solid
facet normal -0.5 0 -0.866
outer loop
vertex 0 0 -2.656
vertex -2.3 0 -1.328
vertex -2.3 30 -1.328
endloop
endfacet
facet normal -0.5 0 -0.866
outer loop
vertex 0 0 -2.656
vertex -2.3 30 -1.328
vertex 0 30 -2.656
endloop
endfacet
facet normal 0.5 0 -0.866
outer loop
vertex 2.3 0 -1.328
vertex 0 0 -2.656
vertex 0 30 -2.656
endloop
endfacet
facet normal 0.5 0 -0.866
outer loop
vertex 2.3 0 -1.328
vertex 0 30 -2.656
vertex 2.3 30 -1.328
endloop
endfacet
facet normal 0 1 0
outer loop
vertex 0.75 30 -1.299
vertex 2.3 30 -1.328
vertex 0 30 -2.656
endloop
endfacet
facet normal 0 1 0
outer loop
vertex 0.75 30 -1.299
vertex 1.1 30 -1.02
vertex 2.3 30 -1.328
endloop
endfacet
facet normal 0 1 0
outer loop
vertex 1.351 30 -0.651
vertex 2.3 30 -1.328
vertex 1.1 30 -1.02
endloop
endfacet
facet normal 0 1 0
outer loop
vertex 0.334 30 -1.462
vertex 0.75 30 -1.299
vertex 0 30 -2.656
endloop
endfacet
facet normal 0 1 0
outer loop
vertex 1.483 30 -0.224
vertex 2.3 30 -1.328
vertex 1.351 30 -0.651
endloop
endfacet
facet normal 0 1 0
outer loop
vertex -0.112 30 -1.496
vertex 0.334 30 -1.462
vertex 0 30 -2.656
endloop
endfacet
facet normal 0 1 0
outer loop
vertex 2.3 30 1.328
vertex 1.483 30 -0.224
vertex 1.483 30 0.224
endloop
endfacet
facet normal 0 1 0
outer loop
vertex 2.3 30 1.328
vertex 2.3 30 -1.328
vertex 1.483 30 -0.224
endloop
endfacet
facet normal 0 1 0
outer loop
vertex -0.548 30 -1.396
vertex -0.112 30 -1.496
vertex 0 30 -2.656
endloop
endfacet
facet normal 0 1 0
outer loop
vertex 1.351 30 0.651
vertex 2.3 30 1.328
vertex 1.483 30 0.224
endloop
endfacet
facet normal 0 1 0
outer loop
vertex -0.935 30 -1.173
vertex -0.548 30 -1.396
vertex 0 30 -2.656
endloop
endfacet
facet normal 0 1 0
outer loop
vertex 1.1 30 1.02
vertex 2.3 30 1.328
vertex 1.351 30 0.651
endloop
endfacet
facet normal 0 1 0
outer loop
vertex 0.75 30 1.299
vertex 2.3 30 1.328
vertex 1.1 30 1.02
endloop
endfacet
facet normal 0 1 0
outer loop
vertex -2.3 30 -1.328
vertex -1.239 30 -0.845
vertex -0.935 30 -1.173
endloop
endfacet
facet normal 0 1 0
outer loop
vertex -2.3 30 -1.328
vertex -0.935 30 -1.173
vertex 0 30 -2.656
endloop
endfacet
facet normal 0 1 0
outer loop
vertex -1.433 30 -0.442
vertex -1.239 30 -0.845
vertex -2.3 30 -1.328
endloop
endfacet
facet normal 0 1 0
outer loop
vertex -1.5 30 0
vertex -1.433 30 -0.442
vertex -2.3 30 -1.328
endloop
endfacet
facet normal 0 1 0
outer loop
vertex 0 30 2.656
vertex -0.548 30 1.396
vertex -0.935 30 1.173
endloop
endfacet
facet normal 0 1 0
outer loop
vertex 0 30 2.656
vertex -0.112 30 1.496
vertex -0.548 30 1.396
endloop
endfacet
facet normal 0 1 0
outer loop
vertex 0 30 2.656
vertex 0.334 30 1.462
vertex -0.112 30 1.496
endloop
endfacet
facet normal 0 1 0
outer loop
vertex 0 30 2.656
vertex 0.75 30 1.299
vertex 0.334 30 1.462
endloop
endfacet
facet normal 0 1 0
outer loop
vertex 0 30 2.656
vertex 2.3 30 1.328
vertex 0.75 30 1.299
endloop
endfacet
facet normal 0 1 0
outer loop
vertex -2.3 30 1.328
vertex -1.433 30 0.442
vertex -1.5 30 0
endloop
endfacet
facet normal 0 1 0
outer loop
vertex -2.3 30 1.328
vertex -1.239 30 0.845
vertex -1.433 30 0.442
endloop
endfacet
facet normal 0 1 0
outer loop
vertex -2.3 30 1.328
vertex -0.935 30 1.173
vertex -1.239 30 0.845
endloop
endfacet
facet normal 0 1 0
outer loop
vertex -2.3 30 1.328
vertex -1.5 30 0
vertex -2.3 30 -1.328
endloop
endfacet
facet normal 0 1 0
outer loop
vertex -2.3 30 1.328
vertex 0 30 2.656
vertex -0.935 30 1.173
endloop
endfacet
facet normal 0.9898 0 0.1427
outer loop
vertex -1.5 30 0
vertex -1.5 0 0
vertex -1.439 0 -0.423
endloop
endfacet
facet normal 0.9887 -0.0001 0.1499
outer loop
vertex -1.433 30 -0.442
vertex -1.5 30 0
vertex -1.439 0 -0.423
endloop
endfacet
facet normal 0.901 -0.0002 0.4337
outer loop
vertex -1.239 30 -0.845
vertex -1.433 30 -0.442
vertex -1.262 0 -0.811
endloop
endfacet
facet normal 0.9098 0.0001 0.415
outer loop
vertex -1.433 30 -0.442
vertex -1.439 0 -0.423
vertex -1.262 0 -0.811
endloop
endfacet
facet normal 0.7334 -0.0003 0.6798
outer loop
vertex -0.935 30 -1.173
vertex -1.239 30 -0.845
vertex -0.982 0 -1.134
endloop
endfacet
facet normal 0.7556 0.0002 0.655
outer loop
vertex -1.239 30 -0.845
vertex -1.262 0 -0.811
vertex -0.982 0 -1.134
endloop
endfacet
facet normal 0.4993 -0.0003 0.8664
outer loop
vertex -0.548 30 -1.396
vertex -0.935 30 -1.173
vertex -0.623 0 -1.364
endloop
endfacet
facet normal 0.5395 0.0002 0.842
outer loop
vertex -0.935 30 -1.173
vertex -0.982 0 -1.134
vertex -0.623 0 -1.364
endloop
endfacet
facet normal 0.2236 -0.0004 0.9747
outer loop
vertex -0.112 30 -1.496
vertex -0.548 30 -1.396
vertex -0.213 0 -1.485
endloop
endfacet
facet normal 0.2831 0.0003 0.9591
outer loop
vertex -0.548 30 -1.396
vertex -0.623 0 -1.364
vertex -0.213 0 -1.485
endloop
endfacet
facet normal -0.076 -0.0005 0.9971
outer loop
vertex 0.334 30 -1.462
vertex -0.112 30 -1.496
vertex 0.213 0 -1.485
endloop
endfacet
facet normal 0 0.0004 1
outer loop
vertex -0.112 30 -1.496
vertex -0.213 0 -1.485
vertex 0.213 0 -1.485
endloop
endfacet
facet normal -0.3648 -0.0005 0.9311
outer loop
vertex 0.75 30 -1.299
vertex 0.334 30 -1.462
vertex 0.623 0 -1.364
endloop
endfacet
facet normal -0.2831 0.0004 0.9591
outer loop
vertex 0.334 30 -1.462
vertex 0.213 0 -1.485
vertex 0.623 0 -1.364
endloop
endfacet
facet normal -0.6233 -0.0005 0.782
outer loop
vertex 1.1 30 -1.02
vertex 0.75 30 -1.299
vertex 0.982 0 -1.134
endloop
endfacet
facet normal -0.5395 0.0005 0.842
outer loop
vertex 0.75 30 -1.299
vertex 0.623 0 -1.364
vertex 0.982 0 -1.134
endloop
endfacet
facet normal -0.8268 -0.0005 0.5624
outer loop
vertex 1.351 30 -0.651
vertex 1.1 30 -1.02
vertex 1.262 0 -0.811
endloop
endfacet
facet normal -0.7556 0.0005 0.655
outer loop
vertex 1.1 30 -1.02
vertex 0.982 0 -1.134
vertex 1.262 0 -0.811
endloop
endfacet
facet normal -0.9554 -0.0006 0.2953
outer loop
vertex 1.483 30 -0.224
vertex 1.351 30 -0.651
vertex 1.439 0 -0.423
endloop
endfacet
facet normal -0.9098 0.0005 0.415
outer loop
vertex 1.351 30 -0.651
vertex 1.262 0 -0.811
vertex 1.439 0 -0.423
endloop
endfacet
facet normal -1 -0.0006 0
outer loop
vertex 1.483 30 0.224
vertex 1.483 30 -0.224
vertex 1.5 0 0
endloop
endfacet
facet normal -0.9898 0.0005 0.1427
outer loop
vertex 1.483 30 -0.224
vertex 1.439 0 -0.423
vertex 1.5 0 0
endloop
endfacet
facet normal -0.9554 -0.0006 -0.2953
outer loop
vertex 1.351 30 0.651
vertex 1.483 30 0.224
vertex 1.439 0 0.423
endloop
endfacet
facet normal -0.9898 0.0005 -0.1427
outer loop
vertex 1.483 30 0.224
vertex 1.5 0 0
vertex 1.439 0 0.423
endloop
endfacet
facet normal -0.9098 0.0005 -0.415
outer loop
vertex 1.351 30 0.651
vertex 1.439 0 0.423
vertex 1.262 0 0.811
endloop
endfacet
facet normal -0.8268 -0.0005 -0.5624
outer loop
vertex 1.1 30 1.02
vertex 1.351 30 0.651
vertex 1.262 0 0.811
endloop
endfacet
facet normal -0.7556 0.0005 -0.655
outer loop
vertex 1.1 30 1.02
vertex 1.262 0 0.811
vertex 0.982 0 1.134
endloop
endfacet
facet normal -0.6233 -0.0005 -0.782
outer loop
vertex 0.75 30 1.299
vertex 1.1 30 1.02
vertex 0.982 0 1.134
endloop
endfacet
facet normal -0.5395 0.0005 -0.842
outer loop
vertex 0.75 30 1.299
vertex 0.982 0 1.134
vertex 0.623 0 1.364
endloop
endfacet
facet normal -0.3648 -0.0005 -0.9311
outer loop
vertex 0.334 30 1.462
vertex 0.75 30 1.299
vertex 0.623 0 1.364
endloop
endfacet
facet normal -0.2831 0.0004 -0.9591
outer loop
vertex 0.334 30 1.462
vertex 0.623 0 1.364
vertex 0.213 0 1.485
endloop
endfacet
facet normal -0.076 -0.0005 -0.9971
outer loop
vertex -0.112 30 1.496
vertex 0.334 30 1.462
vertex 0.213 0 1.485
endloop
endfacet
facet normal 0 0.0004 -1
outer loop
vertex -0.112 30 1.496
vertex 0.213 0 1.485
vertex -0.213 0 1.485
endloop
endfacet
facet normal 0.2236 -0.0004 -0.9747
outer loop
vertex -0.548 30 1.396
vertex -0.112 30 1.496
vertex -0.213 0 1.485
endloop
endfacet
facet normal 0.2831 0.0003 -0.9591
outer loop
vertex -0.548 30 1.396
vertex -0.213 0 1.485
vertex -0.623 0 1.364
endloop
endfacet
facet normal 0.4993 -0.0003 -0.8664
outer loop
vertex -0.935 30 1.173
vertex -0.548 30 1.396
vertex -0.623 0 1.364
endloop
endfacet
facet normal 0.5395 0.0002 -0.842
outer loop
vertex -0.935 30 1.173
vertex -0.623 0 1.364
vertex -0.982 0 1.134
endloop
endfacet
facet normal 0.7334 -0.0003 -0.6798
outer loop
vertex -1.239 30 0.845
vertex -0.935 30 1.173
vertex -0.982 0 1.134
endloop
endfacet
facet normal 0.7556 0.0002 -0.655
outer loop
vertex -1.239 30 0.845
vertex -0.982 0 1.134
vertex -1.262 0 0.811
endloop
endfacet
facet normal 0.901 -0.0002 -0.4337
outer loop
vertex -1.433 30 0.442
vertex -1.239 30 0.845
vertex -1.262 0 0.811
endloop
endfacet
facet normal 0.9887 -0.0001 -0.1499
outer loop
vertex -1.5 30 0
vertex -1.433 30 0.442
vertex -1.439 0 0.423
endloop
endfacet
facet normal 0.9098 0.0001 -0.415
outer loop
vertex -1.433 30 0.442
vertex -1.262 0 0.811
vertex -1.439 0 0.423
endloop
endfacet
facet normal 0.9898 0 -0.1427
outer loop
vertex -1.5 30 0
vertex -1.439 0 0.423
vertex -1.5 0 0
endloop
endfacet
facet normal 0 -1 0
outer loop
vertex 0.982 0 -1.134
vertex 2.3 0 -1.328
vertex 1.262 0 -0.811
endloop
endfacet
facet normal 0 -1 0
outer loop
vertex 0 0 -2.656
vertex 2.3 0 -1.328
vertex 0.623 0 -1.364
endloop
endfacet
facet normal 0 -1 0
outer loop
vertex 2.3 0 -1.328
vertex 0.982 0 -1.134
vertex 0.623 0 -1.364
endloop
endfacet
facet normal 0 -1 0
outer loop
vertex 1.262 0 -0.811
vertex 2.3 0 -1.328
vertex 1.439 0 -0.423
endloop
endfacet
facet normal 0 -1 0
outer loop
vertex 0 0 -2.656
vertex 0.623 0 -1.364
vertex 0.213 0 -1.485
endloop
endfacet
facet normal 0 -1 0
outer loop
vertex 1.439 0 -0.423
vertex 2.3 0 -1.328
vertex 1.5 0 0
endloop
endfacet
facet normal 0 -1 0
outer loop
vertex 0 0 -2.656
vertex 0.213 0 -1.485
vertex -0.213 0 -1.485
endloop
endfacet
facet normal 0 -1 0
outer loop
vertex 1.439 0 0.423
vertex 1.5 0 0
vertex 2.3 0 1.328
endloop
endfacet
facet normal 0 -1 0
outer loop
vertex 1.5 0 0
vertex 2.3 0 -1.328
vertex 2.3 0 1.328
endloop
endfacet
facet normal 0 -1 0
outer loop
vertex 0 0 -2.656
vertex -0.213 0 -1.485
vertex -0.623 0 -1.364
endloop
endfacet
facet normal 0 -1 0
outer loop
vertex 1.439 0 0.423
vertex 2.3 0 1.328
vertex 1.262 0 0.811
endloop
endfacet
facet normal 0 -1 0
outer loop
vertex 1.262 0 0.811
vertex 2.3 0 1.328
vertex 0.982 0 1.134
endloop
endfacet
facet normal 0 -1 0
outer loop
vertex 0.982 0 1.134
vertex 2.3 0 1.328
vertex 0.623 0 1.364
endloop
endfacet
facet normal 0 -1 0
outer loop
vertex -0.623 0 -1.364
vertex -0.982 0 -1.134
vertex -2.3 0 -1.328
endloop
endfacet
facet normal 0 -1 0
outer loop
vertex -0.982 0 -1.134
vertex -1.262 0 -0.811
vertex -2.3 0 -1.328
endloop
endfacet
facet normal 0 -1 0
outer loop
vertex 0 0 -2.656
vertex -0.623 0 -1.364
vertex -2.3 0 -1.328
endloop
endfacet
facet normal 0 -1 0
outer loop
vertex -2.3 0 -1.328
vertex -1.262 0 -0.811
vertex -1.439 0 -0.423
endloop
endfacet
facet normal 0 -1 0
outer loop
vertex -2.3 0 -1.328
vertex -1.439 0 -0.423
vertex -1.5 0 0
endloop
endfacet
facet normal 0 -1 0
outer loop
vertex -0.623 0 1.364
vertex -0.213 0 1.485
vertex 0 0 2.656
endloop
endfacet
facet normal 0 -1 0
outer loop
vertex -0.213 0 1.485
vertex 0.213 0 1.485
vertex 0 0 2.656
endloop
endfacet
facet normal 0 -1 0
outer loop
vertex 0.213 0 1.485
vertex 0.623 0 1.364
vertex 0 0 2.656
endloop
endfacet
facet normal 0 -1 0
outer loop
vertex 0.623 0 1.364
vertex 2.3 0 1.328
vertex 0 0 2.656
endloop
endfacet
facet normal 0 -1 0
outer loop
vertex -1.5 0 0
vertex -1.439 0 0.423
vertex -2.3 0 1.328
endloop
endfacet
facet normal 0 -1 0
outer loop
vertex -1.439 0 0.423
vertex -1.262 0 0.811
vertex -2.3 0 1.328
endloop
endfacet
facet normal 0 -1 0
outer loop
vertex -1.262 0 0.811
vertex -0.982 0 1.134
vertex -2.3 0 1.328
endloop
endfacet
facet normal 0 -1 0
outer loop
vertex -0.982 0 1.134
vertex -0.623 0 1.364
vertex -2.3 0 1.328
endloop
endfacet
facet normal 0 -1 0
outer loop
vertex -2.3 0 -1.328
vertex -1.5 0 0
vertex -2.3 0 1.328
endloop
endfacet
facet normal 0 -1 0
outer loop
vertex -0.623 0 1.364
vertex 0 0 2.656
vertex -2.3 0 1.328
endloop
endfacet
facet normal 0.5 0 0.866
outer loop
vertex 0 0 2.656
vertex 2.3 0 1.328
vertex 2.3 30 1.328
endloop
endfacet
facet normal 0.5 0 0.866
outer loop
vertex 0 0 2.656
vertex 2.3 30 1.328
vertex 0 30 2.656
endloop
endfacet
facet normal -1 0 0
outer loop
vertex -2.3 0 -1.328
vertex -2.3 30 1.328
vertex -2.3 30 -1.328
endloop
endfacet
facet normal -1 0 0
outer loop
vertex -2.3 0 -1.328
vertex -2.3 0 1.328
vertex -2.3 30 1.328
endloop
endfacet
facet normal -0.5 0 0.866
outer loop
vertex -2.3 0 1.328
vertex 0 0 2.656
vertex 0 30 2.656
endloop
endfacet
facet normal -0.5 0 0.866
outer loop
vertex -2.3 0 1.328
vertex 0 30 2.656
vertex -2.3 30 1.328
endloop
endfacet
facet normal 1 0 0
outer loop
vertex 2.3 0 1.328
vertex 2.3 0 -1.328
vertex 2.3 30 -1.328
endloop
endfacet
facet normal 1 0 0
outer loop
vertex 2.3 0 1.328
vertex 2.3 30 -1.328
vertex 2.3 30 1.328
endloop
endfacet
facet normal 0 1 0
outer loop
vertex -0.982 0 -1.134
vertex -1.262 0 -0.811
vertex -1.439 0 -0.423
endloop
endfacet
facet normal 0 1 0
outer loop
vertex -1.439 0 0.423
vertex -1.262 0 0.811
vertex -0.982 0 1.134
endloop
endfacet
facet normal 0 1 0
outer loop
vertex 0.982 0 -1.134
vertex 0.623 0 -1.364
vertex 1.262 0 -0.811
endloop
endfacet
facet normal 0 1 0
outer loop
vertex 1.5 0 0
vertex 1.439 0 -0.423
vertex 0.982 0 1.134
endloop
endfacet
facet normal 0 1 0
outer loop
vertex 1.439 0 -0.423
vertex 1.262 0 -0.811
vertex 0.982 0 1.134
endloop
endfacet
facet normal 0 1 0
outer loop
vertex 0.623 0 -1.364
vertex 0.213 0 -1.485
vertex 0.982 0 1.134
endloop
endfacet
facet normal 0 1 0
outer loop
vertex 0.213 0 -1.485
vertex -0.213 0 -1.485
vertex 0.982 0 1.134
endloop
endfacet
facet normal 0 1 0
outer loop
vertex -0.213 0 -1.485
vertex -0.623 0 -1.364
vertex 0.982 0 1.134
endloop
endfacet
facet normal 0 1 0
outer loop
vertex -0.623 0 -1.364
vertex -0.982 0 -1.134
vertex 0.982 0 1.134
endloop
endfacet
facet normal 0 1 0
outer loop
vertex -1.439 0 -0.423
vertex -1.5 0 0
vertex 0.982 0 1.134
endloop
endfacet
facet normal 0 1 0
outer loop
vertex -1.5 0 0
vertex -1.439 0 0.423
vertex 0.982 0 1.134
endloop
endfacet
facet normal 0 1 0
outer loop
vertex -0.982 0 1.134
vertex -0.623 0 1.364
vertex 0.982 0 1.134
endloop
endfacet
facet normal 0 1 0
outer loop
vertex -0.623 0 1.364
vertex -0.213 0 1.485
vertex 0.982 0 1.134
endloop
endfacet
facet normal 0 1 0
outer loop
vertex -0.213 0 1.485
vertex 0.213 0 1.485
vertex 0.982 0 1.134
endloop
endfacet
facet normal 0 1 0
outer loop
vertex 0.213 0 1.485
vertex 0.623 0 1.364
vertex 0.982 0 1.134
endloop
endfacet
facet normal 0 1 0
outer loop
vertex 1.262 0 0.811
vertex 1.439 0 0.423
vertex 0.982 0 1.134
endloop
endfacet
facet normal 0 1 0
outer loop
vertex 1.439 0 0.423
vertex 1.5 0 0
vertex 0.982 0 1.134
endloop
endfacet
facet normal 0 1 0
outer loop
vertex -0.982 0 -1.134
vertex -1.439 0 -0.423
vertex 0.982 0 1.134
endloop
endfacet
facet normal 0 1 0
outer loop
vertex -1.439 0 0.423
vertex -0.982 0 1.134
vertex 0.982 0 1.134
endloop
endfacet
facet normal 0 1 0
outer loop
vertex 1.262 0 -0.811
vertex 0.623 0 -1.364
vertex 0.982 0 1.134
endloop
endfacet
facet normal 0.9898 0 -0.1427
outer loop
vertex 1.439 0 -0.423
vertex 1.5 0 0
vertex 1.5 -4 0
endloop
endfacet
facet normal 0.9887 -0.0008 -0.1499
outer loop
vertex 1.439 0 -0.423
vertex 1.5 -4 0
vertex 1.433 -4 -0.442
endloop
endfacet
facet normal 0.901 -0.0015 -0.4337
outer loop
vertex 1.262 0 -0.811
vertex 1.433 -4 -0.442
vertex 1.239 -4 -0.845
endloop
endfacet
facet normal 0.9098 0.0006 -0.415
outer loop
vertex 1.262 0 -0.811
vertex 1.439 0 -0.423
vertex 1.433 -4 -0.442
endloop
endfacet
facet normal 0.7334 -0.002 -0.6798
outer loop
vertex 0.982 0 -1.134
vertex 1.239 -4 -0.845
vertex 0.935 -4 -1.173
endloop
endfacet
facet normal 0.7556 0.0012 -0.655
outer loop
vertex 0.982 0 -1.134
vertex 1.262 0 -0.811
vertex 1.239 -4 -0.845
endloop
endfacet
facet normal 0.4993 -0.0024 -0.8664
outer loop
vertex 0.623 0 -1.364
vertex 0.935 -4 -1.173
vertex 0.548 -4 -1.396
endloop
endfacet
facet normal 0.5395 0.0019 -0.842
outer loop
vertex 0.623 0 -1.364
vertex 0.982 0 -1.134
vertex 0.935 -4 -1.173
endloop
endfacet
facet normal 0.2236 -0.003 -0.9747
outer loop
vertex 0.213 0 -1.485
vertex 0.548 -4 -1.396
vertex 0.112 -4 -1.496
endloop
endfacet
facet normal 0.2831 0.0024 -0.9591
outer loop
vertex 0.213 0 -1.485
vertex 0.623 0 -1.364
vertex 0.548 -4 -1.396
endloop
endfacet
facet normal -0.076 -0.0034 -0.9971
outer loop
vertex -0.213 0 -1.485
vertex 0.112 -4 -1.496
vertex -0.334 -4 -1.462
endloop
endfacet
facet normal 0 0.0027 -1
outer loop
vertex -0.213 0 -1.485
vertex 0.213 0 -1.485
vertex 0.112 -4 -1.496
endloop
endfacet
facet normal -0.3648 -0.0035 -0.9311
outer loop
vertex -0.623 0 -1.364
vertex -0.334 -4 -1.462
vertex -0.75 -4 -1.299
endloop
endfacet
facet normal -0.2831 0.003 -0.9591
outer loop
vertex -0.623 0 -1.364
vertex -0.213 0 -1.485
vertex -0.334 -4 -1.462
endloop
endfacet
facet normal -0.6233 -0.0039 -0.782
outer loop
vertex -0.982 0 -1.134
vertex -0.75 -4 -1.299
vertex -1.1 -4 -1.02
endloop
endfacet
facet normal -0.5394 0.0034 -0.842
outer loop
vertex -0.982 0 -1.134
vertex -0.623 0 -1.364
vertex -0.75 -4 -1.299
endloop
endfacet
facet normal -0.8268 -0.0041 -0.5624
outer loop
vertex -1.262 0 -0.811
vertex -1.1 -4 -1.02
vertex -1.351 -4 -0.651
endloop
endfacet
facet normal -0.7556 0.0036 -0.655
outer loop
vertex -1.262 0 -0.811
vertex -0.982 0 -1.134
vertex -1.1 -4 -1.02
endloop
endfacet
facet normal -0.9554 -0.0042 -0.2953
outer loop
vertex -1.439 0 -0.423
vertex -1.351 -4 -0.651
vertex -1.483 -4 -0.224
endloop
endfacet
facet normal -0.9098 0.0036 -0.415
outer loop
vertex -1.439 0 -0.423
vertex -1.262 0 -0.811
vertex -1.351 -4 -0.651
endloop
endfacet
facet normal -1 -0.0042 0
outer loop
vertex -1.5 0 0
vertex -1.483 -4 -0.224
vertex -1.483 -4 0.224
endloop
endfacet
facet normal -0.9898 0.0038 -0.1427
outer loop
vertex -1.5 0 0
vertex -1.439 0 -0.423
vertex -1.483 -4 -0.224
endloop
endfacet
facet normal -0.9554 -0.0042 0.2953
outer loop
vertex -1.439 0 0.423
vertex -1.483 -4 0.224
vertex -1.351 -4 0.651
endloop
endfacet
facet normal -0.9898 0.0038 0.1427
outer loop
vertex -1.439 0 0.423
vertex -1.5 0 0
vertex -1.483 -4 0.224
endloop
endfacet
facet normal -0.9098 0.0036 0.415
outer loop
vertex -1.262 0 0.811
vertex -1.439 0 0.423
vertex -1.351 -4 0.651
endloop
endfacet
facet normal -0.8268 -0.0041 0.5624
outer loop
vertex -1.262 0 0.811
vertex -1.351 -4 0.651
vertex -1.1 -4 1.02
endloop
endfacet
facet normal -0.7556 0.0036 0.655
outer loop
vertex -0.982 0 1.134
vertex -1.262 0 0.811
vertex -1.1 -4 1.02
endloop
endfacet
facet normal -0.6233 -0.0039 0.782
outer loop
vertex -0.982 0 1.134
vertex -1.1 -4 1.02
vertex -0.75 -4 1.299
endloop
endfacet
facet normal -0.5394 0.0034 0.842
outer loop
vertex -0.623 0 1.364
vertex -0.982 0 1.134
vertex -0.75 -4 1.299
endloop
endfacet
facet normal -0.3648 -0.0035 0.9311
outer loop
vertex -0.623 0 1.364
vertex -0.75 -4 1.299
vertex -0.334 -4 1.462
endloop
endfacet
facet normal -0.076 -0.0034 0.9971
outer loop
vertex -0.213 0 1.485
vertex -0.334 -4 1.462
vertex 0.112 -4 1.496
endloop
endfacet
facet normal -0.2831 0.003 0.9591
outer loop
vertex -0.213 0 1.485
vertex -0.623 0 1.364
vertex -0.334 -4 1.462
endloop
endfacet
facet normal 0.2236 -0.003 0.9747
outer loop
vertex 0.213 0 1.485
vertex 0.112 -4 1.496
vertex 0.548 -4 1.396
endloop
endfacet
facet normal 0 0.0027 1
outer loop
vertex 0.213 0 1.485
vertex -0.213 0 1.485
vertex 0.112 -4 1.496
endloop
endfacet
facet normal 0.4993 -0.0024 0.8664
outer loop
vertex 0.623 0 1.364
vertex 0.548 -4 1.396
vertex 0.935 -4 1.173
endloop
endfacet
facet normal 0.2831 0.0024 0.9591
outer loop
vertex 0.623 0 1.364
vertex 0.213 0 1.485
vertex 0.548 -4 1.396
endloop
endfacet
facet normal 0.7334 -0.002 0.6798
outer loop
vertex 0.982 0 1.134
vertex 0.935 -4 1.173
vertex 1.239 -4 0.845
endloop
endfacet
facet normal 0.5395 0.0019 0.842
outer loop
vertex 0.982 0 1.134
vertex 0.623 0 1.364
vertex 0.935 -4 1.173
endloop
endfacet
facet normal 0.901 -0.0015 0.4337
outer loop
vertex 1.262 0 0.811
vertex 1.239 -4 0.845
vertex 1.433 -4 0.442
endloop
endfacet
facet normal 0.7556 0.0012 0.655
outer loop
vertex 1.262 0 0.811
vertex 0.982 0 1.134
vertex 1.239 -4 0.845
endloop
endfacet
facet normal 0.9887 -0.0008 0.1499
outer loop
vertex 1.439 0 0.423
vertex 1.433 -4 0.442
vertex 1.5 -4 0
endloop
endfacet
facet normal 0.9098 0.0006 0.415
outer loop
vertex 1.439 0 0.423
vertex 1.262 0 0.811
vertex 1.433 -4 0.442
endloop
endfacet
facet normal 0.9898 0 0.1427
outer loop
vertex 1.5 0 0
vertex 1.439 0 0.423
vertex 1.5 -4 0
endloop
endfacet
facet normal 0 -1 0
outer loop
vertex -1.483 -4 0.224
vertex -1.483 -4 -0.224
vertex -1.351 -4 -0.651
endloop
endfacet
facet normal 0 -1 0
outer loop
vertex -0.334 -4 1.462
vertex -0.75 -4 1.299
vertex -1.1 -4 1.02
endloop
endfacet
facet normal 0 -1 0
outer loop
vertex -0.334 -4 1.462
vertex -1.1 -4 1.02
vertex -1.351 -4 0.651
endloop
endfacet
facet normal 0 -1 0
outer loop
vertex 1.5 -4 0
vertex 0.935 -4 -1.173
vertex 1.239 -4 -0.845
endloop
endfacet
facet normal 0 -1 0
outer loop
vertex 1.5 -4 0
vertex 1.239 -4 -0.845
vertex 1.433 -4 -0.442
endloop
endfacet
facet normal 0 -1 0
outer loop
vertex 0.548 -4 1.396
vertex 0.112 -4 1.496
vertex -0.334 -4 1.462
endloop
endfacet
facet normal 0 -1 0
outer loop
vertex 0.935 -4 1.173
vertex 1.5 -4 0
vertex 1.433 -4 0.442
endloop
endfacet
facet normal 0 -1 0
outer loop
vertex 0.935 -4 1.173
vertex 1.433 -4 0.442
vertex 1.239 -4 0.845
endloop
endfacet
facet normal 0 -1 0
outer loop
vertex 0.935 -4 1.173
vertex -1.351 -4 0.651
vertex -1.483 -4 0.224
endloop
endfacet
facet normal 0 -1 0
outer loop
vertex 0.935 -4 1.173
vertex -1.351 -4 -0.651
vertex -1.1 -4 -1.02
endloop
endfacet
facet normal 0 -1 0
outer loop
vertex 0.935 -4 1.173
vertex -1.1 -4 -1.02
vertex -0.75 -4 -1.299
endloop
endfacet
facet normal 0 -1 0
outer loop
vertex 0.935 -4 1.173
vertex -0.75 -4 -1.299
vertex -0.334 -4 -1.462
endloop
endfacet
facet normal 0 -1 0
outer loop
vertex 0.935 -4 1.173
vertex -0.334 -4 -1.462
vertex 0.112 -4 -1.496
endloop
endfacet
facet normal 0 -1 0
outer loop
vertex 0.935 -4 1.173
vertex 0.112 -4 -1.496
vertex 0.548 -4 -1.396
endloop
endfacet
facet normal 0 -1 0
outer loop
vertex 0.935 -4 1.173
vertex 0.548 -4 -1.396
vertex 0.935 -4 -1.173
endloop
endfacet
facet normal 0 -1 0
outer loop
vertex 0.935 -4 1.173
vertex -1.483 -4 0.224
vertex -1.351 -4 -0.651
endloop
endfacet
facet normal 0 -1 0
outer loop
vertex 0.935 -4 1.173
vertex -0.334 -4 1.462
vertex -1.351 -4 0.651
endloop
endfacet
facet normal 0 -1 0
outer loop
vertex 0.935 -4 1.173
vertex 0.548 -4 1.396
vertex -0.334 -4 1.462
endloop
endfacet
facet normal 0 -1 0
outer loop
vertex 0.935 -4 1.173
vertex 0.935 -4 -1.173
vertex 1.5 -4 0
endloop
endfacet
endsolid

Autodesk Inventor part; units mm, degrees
ref_plane "YZ Plane" through (0, 0, 0) normal (1, 0, 0) x (0, 1, 0)
ref_plane "XZ Plane" through (0, 0, 0) normal (0, 1, 0) x (-1, 0, 0)
ref_plane "XY Plane" through (0, 0, 0) normal (0, 0, 1) x (1, 0, 0)
sketch "Sketch1" plane through (0, 0, 0) normal (0, 1, 0) x (-1, 0, 0)
  line L0 (0, -2.6558) -> (-2.3, -1.3279)
  line L1 (-2.3, -1.3279) -> (-2.3, 1.3279)
  line L2 (-2.3, 1.3279) -> (0, 2.6558)
  line L3 (0, 2.6558) -> (2.3, 1.3279)
  line L4 (2.3, 1.3279) -> (2.3, -1.3279)
  line L5 (2.3, -1.3279) -> (0, -2.6558)
  circle A0 centre (0, 0) radius 1.5
  dimension "d0" = 4.6
  dimension "d1" = 3
extrude "Extrusion1" add sketch "Sketch1" along normal blind 30
sketch "Sketch2" plane through (0, 0, 0) normal (0, -1, 0) x (1, 0, 0)
  circle A0 centre (0, 0) radius 1.5 projected
extrude "Extrusion2" add sketch "Sketch2" along normal blind 4
properties part number "m3_standoff_30mm" material "Brass, Soft Yellow"
